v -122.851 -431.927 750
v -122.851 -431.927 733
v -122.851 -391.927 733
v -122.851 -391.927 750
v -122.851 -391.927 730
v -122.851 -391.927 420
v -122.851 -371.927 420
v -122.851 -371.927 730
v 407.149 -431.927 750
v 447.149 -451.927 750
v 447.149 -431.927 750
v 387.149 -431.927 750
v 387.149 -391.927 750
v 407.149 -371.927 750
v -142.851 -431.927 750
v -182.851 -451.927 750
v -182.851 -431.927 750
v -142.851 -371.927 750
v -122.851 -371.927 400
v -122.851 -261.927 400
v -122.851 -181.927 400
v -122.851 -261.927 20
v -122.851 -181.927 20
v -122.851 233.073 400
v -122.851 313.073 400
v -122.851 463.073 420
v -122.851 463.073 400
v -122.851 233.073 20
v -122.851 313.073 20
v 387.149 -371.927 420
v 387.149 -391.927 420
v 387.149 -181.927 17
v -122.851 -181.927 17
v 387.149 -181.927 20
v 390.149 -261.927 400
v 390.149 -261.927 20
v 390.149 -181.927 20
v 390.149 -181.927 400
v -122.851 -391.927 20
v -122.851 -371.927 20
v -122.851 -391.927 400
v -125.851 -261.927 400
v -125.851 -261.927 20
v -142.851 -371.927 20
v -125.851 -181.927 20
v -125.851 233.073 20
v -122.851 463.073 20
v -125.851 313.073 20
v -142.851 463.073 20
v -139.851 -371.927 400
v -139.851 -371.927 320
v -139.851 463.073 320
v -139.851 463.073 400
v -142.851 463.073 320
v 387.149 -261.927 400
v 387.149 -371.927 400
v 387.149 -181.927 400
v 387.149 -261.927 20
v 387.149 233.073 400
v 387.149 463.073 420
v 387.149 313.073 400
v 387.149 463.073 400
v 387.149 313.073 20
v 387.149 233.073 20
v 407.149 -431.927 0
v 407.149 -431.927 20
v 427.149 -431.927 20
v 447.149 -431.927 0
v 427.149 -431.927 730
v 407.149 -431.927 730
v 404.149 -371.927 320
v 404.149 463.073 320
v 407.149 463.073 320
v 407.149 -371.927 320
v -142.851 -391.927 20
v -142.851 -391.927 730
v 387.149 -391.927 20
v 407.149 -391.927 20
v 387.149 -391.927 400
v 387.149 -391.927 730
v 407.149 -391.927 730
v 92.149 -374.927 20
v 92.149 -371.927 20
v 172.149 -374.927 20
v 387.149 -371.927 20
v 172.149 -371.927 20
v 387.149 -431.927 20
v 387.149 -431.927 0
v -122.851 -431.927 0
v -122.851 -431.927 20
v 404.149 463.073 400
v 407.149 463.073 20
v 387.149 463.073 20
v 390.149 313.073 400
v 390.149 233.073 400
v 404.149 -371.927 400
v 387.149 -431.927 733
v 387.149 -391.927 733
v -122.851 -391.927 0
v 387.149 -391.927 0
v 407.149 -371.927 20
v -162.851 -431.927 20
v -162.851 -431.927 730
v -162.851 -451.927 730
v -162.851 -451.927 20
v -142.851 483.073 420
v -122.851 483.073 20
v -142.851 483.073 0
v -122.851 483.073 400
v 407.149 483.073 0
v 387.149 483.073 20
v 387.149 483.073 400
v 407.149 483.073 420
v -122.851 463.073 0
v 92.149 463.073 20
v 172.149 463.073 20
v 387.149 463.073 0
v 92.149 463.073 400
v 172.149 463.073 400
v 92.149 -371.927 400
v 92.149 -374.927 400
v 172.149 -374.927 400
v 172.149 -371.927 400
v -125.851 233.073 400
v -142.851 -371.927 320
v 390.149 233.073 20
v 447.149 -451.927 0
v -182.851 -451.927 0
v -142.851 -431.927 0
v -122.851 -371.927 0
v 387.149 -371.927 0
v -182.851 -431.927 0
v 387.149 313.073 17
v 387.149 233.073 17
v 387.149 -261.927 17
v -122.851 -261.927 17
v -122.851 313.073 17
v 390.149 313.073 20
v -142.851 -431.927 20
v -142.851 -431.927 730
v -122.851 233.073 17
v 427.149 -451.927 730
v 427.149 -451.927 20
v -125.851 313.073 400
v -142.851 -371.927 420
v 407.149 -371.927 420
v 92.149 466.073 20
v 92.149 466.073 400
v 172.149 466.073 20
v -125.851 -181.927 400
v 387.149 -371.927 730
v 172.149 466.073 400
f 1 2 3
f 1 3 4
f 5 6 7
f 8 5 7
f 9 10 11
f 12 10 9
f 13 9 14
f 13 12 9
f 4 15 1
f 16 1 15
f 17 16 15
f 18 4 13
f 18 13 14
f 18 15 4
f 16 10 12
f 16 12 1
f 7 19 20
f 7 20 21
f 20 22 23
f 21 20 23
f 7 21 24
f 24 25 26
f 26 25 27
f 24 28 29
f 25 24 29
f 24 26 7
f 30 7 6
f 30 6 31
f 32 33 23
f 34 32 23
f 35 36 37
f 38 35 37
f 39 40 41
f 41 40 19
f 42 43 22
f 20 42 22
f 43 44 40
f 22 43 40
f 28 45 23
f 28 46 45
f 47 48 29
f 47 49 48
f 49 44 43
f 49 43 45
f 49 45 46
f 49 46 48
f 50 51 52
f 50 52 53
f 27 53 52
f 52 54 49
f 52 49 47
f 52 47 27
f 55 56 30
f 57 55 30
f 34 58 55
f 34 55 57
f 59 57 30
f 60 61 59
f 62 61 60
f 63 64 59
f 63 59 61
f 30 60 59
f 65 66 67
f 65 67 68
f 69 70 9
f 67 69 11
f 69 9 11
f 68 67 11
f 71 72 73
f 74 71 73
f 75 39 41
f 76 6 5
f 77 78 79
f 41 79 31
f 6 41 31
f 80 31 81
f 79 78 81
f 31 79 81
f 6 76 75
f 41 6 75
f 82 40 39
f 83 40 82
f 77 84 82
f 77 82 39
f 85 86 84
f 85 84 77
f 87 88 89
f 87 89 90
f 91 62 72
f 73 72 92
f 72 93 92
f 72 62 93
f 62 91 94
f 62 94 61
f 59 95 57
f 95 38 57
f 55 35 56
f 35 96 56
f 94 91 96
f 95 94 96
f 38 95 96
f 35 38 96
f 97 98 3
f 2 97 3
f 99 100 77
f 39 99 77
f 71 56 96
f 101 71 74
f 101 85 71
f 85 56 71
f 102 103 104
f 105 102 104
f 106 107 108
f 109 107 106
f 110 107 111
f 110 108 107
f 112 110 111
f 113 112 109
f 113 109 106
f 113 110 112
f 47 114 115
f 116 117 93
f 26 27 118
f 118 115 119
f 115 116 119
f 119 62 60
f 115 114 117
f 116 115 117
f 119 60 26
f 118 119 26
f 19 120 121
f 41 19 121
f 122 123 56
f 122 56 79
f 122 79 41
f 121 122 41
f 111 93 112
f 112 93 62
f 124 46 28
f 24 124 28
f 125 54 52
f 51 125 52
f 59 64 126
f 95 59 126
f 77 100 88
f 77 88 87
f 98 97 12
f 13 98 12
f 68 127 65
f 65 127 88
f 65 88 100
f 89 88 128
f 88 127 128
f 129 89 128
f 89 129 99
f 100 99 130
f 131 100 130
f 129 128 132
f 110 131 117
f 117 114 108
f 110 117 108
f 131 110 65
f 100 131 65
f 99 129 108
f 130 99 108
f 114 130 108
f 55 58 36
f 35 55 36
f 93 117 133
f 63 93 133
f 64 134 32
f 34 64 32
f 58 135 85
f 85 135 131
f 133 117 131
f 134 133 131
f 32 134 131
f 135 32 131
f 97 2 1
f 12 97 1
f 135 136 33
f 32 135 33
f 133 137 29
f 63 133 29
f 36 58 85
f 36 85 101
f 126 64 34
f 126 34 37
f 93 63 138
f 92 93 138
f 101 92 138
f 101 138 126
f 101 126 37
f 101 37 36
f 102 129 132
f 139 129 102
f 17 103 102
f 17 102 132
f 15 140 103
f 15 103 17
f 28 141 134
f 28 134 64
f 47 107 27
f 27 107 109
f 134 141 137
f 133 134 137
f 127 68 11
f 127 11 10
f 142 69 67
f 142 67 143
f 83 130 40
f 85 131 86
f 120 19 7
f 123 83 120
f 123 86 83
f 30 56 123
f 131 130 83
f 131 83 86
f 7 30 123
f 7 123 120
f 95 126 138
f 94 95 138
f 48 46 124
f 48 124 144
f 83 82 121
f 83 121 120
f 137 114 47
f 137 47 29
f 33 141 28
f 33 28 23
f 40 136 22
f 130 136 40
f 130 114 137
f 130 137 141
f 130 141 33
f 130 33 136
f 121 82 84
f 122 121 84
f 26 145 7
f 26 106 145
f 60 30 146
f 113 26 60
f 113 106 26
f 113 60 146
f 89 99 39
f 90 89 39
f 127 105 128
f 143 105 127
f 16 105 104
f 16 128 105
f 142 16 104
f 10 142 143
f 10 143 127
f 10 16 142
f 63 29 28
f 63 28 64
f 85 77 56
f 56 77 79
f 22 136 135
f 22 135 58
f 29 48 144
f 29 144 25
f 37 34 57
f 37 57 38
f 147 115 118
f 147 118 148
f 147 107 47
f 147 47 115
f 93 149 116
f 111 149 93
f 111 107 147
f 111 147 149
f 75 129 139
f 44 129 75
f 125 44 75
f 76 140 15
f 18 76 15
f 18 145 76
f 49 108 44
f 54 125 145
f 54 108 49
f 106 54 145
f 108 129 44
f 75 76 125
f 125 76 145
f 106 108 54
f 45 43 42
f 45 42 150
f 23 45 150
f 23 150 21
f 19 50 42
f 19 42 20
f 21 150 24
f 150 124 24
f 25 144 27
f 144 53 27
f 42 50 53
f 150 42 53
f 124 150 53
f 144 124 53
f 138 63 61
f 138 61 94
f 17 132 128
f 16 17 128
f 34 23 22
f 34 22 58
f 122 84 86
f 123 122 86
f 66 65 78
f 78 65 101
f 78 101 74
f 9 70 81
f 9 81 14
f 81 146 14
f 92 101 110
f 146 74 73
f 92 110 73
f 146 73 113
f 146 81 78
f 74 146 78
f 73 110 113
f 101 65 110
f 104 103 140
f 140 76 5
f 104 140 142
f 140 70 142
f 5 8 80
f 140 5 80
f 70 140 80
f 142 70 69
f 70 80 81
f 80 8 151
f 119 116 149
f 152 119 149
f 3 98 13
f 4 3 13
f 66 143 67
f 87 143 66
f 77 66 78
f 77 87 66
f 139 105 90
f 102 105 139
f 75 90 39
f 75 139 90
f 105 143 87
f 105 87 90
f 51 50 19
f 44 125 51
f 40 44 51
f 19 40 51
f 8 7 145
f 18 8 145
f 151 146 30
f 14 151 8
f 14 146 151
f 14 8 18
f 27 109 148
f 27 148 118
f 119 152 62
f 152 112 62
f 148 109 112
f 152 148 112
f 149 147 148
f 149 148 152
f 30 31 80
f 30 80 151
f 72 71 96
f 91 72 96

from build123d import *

# Parameters (mm, degrees)
F0_W      = 550
F0_H      = 875
F1_DEPTH  = 20
F2_W      = 510
F2_H      = 835
F3_DEPTH  = 20.001
F4_W      = 80
F4_H      = 3
F5_DEPTH  = 510
F6_W      = 20
F6_H      = 20
F7_DEPTH  = 400
F8_W      = 20
F8_H      = 20
F9_DEPTH  = 835
F10_W     = 20
F10_H     = 20
F11_DEPTH = 835
F12_W     = 20
F12_H     = 20
F13_DEPTH = 510
F15_W     = 3
F15_H     = 80
F16_DEPTH = 835
F17_W     = 3
F17_H     = 80
F18_DEPTH = 835
F19_W     = 20
F19_H     = 20
F20_DEPTH = 510
F14_W     = 80
F14_H     = 3
F14_W_2   = 3
F14_H_2   = 80
F21_DEPTH = 380
F22_DEPTH = 400
F23_W     = 20
F23_H     = 20
F24_DEPTH = 330
F25_W     = 20
F25_H     = 20
F26_DEPTH = 510
F27_W     = 20
F27_H     = 20
F28_DEPTH = 60
F29_W     = 20
F29_H     = 20
F30_DEPTH = 510
F31_W     = 20
F31_H     = 20
F32_DEPTH = 510
F33_W     = 20
F33_H     = 20
F34_DEPTH = 40
F35_W     = 20
F35_H     = 20
F36_DEPTH = 40
F37_W     = 20
F37_H     = 20
F38_DEPTH = 710
F40_DEPTH = 40


with BuildPart() as f1:
    # F0 (on Top) → F1 (new body)
    with BuildSketch(Plane.XY):
        with Locations((132.149377, 45.573115)):
            Rectangle(F0_W, F0_H)
    extrude(amount=F1_DEPTH)

    # F2 (on face) → F3 (cut, through all)
    with BuildSketch(Plane(origin=(0, 0, 0), x_dir=(1, 0, 0), z_dir=(0, 0, -1))):
        with Locations((132.149377, -45.573115)):
            Rectangle(F2_W, F2_H)
    extrude(amount=-F3_DEPTH, mode=Mode.SUBTRACT)

    # F4 (on face) → F5 (join, through all)
    with BuildSketch(Plane.YZ.offset(-122.850623)):
        with Locations((273.073115, 18.5)):
            Rectangle(F4_W, F4_H)
        with Locations((-221.926885, 18.5)):
            Rectangle(F4_W, F4_H)
    extrude(amount=F5_DEPTH)



with BuildPart() as f7:
    # F6 (on face) → F7 (new body)
    with BuildSketch(Plane.XY.offset(20)):
        with Locations((-132.850623, -381.926885)):
            Rectangle(F6_W, F6_H)
        with Locations((397.149377, -381.926885)):
            Rectangle(F6_W, F6_H)
        with Locations((-132.850623, 473.073115)):
            Rectangle(F6_W, F6_H)
        with Locations((397.149377, 473.073115)):
            Rectangle(F6_W, F6_H)
    extrude(amount=F7_DEPTH)

    # F8 (on face) → F9 (join, through all)
    with BuildSketch(Plane(origin=(0, -371.926885, 0), x_dir=(-1, 0, 0), z_dir=(0, 1, 0))):
        with Locations((-397.149377, 410)):
            Rectangle(F8_W, F8_H)
    extrude(amount=F9_DEPTH)

    # F10 (on face) → F11 (join, through all)
    with BuildSketch(Plane.XZ.offset(-463.073115)):
        with Locations((-132.850623, 410)):
            Rectangle(F10_W, F10_H)
    extrude(amount=F11_DEPTH)

    # F12 (on face) → F13 (join, through all)
    with BuildSketch(Plane(origin=(387.149377, 0, 0), x_dir=(0, -1, 0), z_dir=(-1, 0, 0))):
        with Locations((381.926885, 410)):
            Rectangle(F12_W, F12_H)
    extrude(amount=F13_DEPTH)

    # F15 (on face) → F16 (join, through all)
    with BuildSketch(Plane.XZ.offset(-463.073115)):
        with Locations((405.649377, 360)):
            Rectangle(F15_W, F15_H)
    extrude(amount=F16_DEPTH)

    # F17 (on face) → F18 (join, through all)
    with BuildSketch(Plane.XZ.offset(-463.073115)):
        with Locations((-141.350623, 360)):
            Rectangle(F17_W, F17_H)
    extrude(amount=F18_DEPTH)

    # F19 (on face) → F20 (join, through all)
    with BuildSketch(Plane(origin=(387.149377, 0, 0), x_dir=(0, -1, 0), z_dir=(-1, 0, 0))):
        with Locations((-473.073115, 410)):
            Rectangle(F19_W, F19_H)
    extrude(amount=F20_DEPTH)


with BuildPart() as f1_1:
    add(f1.part)

    add(f7.part)  # F21 merges F7
    # F14 (on face) → F21 (join, through all)
    with BuildSketch(Plane.XY.offset(20)):
        with Locations((132.149377, -373.426885)):
            Rectangle(F14_W, F14_H)
        with Locations((132.149377, 464.573115)):
            Rectangle(F14_W, F14_H)
        with Locations((388.649377, 273.073115)):
            Rectangle(F14_W_2, F14_H_2)
        with Locations((388.649377, -221.926885)):
            Rectangle(F14_W_2, F14_H_2)
        with Locations((-124.350623, -221.926885)):
            Rectangle(F14_W_2, F14_H_2)
        with Locations((-124.350623, 273.073115)):
            Rectangle(F14_W_2, F14_H_2)
    extrude(amount=F21_DEPTH)

    # F14 (on face) → F22 (join, through all)
    with BuildSketch(Plane.XY.offset(20)):
        with Locations((132.149377, -373.426885)):
            Rectangle(F14_W, F14_H)
        with Locations((132.149377, 464.573115)):
            Rectangle(F14_W, F14_H)
        with Locations((388.649377, 273.073115)):
            Rectangle(F14_W_2, F14_H_2)
        with Locations((388.649377, -221.926885)):
            Rectangle(F14_W_2, F14_H_2)
        with Locations((-124.350623, -221.926885)):
            Rectangle(F14_W_2, F14_H_2)
        with Locations((-124.350623, 273.073115)):
            Rectangle(F14_W_2, F14_H_2)
    extrude(amount=F22_DEPTH)

    # F23 (on face) → F24 (join)
    with BuildSketch(Plane.XY.offset(420)):
        with Locations((-132.850623, -381.926885)):
            Rectangle(F23_W, F23_H)
        with Locations((397.149377, -381.926885)):
            Rectangle(F23_W, F23_H)
    extrude(amount=F24_DEPTH)

    # F25 (on face) → F26 (join, through all)
    with BuildSketch(Plane(origin=(387.149377, 0, 0), x_dir=(0, -1, 0), z_dir=(-1, 0, 0))):
        with Locations((381.926885, 740)):
            Rectangle(F25_W, F25_H)
    extrude(amount=F26_DEPTH)

    # F27 (on face) → F28 (join)
    with BuildSketch(Plane.XZ.offset(391.926885)):
        with Locations((-132.850623, 10)):
            Rectangle(F27_W, F27_H)
        with Locations((397.149377, 10)):
            Rectangle(F27_W, F27_H)
        with Locations((-132.850623, 740)):
            Rectangle(F27_W, F27_H)
        with Locations((397.149377, 740)):
            Rectangle(F27_W, F27_H)
    extrude(amount=F28_DEPTH)

    # F29 (on face) → F30 (join, through all)
    with BuildSketch(Plane.YZ.offset(-122.850623)):
        with Locations((-441.926885, 740)):
            Rectangle(F29_W, F29_H)
    extrude(amount=F30_DEPTH)

    # F31 (on face) → F32 (join, through all)
    with BuildSketch(Plane(origin=(387.149377, 0, 0), x_dir=(0, -1, 0), z_dir=(-1, 0, 0))):
        with Locations((441.926885, 10)):
            Rectangle(F31_W, F31_H)
    extrude(amount=F32_DEPTH)

    # F33 (on face) → F34 (join)
    with BuildSketch(Plane(origin=(-142.850623, 0, 0), x_dir=(0, -1, 0), z_dir=(-1, 0, 0))):
        with Locations((441.926885, 10)):
            Rectangle(F33_W, F33_H)
        with Locations((441.926885, 740)):
            Rectangle(F33_W, F33_H)
    extrude(amount=F34_DEPTH)

    # F35 (on face) → F36 (join)
    with BuildSketch(Plane.YZ.offset(407.149377)):
        with Locations((-441.926885, 10)):
            Rectangle(F35_W, F35_H)
        with Locations((-441.926885, 740)):
            Rectangle(F35_W, F35_H)
    extrude(amount=F36_DEPTH)

    # F37 (on face) → F38 (join, through all)
    with BuildSketch(Plane(origin=(0, 0, 730), x_dir=(1, 0, 0), z_dir=(0, 0, -1))):
        with Locations((437.149377, 441.926885)):
            Rectangle(F37_W, F37_H)
        with Locations((-172.850623, 441.926885)):
            Rectangle(F37_W, F37_H)
    extrude(amount=F38_DEPTH)

    # F39 (on face) → F40 (join, through all)
    with BuildSketch(Plane.XZ.offset(391.926885)):
        Polygon((114.305049, 733), (-122.850623, 733), (-122.850623, 730), (114.305049, 730), (387.149377, 730), (387.149377, 733), align=None)
    extrude(amount=F40_DEPTH)


solid = f1_1.part
